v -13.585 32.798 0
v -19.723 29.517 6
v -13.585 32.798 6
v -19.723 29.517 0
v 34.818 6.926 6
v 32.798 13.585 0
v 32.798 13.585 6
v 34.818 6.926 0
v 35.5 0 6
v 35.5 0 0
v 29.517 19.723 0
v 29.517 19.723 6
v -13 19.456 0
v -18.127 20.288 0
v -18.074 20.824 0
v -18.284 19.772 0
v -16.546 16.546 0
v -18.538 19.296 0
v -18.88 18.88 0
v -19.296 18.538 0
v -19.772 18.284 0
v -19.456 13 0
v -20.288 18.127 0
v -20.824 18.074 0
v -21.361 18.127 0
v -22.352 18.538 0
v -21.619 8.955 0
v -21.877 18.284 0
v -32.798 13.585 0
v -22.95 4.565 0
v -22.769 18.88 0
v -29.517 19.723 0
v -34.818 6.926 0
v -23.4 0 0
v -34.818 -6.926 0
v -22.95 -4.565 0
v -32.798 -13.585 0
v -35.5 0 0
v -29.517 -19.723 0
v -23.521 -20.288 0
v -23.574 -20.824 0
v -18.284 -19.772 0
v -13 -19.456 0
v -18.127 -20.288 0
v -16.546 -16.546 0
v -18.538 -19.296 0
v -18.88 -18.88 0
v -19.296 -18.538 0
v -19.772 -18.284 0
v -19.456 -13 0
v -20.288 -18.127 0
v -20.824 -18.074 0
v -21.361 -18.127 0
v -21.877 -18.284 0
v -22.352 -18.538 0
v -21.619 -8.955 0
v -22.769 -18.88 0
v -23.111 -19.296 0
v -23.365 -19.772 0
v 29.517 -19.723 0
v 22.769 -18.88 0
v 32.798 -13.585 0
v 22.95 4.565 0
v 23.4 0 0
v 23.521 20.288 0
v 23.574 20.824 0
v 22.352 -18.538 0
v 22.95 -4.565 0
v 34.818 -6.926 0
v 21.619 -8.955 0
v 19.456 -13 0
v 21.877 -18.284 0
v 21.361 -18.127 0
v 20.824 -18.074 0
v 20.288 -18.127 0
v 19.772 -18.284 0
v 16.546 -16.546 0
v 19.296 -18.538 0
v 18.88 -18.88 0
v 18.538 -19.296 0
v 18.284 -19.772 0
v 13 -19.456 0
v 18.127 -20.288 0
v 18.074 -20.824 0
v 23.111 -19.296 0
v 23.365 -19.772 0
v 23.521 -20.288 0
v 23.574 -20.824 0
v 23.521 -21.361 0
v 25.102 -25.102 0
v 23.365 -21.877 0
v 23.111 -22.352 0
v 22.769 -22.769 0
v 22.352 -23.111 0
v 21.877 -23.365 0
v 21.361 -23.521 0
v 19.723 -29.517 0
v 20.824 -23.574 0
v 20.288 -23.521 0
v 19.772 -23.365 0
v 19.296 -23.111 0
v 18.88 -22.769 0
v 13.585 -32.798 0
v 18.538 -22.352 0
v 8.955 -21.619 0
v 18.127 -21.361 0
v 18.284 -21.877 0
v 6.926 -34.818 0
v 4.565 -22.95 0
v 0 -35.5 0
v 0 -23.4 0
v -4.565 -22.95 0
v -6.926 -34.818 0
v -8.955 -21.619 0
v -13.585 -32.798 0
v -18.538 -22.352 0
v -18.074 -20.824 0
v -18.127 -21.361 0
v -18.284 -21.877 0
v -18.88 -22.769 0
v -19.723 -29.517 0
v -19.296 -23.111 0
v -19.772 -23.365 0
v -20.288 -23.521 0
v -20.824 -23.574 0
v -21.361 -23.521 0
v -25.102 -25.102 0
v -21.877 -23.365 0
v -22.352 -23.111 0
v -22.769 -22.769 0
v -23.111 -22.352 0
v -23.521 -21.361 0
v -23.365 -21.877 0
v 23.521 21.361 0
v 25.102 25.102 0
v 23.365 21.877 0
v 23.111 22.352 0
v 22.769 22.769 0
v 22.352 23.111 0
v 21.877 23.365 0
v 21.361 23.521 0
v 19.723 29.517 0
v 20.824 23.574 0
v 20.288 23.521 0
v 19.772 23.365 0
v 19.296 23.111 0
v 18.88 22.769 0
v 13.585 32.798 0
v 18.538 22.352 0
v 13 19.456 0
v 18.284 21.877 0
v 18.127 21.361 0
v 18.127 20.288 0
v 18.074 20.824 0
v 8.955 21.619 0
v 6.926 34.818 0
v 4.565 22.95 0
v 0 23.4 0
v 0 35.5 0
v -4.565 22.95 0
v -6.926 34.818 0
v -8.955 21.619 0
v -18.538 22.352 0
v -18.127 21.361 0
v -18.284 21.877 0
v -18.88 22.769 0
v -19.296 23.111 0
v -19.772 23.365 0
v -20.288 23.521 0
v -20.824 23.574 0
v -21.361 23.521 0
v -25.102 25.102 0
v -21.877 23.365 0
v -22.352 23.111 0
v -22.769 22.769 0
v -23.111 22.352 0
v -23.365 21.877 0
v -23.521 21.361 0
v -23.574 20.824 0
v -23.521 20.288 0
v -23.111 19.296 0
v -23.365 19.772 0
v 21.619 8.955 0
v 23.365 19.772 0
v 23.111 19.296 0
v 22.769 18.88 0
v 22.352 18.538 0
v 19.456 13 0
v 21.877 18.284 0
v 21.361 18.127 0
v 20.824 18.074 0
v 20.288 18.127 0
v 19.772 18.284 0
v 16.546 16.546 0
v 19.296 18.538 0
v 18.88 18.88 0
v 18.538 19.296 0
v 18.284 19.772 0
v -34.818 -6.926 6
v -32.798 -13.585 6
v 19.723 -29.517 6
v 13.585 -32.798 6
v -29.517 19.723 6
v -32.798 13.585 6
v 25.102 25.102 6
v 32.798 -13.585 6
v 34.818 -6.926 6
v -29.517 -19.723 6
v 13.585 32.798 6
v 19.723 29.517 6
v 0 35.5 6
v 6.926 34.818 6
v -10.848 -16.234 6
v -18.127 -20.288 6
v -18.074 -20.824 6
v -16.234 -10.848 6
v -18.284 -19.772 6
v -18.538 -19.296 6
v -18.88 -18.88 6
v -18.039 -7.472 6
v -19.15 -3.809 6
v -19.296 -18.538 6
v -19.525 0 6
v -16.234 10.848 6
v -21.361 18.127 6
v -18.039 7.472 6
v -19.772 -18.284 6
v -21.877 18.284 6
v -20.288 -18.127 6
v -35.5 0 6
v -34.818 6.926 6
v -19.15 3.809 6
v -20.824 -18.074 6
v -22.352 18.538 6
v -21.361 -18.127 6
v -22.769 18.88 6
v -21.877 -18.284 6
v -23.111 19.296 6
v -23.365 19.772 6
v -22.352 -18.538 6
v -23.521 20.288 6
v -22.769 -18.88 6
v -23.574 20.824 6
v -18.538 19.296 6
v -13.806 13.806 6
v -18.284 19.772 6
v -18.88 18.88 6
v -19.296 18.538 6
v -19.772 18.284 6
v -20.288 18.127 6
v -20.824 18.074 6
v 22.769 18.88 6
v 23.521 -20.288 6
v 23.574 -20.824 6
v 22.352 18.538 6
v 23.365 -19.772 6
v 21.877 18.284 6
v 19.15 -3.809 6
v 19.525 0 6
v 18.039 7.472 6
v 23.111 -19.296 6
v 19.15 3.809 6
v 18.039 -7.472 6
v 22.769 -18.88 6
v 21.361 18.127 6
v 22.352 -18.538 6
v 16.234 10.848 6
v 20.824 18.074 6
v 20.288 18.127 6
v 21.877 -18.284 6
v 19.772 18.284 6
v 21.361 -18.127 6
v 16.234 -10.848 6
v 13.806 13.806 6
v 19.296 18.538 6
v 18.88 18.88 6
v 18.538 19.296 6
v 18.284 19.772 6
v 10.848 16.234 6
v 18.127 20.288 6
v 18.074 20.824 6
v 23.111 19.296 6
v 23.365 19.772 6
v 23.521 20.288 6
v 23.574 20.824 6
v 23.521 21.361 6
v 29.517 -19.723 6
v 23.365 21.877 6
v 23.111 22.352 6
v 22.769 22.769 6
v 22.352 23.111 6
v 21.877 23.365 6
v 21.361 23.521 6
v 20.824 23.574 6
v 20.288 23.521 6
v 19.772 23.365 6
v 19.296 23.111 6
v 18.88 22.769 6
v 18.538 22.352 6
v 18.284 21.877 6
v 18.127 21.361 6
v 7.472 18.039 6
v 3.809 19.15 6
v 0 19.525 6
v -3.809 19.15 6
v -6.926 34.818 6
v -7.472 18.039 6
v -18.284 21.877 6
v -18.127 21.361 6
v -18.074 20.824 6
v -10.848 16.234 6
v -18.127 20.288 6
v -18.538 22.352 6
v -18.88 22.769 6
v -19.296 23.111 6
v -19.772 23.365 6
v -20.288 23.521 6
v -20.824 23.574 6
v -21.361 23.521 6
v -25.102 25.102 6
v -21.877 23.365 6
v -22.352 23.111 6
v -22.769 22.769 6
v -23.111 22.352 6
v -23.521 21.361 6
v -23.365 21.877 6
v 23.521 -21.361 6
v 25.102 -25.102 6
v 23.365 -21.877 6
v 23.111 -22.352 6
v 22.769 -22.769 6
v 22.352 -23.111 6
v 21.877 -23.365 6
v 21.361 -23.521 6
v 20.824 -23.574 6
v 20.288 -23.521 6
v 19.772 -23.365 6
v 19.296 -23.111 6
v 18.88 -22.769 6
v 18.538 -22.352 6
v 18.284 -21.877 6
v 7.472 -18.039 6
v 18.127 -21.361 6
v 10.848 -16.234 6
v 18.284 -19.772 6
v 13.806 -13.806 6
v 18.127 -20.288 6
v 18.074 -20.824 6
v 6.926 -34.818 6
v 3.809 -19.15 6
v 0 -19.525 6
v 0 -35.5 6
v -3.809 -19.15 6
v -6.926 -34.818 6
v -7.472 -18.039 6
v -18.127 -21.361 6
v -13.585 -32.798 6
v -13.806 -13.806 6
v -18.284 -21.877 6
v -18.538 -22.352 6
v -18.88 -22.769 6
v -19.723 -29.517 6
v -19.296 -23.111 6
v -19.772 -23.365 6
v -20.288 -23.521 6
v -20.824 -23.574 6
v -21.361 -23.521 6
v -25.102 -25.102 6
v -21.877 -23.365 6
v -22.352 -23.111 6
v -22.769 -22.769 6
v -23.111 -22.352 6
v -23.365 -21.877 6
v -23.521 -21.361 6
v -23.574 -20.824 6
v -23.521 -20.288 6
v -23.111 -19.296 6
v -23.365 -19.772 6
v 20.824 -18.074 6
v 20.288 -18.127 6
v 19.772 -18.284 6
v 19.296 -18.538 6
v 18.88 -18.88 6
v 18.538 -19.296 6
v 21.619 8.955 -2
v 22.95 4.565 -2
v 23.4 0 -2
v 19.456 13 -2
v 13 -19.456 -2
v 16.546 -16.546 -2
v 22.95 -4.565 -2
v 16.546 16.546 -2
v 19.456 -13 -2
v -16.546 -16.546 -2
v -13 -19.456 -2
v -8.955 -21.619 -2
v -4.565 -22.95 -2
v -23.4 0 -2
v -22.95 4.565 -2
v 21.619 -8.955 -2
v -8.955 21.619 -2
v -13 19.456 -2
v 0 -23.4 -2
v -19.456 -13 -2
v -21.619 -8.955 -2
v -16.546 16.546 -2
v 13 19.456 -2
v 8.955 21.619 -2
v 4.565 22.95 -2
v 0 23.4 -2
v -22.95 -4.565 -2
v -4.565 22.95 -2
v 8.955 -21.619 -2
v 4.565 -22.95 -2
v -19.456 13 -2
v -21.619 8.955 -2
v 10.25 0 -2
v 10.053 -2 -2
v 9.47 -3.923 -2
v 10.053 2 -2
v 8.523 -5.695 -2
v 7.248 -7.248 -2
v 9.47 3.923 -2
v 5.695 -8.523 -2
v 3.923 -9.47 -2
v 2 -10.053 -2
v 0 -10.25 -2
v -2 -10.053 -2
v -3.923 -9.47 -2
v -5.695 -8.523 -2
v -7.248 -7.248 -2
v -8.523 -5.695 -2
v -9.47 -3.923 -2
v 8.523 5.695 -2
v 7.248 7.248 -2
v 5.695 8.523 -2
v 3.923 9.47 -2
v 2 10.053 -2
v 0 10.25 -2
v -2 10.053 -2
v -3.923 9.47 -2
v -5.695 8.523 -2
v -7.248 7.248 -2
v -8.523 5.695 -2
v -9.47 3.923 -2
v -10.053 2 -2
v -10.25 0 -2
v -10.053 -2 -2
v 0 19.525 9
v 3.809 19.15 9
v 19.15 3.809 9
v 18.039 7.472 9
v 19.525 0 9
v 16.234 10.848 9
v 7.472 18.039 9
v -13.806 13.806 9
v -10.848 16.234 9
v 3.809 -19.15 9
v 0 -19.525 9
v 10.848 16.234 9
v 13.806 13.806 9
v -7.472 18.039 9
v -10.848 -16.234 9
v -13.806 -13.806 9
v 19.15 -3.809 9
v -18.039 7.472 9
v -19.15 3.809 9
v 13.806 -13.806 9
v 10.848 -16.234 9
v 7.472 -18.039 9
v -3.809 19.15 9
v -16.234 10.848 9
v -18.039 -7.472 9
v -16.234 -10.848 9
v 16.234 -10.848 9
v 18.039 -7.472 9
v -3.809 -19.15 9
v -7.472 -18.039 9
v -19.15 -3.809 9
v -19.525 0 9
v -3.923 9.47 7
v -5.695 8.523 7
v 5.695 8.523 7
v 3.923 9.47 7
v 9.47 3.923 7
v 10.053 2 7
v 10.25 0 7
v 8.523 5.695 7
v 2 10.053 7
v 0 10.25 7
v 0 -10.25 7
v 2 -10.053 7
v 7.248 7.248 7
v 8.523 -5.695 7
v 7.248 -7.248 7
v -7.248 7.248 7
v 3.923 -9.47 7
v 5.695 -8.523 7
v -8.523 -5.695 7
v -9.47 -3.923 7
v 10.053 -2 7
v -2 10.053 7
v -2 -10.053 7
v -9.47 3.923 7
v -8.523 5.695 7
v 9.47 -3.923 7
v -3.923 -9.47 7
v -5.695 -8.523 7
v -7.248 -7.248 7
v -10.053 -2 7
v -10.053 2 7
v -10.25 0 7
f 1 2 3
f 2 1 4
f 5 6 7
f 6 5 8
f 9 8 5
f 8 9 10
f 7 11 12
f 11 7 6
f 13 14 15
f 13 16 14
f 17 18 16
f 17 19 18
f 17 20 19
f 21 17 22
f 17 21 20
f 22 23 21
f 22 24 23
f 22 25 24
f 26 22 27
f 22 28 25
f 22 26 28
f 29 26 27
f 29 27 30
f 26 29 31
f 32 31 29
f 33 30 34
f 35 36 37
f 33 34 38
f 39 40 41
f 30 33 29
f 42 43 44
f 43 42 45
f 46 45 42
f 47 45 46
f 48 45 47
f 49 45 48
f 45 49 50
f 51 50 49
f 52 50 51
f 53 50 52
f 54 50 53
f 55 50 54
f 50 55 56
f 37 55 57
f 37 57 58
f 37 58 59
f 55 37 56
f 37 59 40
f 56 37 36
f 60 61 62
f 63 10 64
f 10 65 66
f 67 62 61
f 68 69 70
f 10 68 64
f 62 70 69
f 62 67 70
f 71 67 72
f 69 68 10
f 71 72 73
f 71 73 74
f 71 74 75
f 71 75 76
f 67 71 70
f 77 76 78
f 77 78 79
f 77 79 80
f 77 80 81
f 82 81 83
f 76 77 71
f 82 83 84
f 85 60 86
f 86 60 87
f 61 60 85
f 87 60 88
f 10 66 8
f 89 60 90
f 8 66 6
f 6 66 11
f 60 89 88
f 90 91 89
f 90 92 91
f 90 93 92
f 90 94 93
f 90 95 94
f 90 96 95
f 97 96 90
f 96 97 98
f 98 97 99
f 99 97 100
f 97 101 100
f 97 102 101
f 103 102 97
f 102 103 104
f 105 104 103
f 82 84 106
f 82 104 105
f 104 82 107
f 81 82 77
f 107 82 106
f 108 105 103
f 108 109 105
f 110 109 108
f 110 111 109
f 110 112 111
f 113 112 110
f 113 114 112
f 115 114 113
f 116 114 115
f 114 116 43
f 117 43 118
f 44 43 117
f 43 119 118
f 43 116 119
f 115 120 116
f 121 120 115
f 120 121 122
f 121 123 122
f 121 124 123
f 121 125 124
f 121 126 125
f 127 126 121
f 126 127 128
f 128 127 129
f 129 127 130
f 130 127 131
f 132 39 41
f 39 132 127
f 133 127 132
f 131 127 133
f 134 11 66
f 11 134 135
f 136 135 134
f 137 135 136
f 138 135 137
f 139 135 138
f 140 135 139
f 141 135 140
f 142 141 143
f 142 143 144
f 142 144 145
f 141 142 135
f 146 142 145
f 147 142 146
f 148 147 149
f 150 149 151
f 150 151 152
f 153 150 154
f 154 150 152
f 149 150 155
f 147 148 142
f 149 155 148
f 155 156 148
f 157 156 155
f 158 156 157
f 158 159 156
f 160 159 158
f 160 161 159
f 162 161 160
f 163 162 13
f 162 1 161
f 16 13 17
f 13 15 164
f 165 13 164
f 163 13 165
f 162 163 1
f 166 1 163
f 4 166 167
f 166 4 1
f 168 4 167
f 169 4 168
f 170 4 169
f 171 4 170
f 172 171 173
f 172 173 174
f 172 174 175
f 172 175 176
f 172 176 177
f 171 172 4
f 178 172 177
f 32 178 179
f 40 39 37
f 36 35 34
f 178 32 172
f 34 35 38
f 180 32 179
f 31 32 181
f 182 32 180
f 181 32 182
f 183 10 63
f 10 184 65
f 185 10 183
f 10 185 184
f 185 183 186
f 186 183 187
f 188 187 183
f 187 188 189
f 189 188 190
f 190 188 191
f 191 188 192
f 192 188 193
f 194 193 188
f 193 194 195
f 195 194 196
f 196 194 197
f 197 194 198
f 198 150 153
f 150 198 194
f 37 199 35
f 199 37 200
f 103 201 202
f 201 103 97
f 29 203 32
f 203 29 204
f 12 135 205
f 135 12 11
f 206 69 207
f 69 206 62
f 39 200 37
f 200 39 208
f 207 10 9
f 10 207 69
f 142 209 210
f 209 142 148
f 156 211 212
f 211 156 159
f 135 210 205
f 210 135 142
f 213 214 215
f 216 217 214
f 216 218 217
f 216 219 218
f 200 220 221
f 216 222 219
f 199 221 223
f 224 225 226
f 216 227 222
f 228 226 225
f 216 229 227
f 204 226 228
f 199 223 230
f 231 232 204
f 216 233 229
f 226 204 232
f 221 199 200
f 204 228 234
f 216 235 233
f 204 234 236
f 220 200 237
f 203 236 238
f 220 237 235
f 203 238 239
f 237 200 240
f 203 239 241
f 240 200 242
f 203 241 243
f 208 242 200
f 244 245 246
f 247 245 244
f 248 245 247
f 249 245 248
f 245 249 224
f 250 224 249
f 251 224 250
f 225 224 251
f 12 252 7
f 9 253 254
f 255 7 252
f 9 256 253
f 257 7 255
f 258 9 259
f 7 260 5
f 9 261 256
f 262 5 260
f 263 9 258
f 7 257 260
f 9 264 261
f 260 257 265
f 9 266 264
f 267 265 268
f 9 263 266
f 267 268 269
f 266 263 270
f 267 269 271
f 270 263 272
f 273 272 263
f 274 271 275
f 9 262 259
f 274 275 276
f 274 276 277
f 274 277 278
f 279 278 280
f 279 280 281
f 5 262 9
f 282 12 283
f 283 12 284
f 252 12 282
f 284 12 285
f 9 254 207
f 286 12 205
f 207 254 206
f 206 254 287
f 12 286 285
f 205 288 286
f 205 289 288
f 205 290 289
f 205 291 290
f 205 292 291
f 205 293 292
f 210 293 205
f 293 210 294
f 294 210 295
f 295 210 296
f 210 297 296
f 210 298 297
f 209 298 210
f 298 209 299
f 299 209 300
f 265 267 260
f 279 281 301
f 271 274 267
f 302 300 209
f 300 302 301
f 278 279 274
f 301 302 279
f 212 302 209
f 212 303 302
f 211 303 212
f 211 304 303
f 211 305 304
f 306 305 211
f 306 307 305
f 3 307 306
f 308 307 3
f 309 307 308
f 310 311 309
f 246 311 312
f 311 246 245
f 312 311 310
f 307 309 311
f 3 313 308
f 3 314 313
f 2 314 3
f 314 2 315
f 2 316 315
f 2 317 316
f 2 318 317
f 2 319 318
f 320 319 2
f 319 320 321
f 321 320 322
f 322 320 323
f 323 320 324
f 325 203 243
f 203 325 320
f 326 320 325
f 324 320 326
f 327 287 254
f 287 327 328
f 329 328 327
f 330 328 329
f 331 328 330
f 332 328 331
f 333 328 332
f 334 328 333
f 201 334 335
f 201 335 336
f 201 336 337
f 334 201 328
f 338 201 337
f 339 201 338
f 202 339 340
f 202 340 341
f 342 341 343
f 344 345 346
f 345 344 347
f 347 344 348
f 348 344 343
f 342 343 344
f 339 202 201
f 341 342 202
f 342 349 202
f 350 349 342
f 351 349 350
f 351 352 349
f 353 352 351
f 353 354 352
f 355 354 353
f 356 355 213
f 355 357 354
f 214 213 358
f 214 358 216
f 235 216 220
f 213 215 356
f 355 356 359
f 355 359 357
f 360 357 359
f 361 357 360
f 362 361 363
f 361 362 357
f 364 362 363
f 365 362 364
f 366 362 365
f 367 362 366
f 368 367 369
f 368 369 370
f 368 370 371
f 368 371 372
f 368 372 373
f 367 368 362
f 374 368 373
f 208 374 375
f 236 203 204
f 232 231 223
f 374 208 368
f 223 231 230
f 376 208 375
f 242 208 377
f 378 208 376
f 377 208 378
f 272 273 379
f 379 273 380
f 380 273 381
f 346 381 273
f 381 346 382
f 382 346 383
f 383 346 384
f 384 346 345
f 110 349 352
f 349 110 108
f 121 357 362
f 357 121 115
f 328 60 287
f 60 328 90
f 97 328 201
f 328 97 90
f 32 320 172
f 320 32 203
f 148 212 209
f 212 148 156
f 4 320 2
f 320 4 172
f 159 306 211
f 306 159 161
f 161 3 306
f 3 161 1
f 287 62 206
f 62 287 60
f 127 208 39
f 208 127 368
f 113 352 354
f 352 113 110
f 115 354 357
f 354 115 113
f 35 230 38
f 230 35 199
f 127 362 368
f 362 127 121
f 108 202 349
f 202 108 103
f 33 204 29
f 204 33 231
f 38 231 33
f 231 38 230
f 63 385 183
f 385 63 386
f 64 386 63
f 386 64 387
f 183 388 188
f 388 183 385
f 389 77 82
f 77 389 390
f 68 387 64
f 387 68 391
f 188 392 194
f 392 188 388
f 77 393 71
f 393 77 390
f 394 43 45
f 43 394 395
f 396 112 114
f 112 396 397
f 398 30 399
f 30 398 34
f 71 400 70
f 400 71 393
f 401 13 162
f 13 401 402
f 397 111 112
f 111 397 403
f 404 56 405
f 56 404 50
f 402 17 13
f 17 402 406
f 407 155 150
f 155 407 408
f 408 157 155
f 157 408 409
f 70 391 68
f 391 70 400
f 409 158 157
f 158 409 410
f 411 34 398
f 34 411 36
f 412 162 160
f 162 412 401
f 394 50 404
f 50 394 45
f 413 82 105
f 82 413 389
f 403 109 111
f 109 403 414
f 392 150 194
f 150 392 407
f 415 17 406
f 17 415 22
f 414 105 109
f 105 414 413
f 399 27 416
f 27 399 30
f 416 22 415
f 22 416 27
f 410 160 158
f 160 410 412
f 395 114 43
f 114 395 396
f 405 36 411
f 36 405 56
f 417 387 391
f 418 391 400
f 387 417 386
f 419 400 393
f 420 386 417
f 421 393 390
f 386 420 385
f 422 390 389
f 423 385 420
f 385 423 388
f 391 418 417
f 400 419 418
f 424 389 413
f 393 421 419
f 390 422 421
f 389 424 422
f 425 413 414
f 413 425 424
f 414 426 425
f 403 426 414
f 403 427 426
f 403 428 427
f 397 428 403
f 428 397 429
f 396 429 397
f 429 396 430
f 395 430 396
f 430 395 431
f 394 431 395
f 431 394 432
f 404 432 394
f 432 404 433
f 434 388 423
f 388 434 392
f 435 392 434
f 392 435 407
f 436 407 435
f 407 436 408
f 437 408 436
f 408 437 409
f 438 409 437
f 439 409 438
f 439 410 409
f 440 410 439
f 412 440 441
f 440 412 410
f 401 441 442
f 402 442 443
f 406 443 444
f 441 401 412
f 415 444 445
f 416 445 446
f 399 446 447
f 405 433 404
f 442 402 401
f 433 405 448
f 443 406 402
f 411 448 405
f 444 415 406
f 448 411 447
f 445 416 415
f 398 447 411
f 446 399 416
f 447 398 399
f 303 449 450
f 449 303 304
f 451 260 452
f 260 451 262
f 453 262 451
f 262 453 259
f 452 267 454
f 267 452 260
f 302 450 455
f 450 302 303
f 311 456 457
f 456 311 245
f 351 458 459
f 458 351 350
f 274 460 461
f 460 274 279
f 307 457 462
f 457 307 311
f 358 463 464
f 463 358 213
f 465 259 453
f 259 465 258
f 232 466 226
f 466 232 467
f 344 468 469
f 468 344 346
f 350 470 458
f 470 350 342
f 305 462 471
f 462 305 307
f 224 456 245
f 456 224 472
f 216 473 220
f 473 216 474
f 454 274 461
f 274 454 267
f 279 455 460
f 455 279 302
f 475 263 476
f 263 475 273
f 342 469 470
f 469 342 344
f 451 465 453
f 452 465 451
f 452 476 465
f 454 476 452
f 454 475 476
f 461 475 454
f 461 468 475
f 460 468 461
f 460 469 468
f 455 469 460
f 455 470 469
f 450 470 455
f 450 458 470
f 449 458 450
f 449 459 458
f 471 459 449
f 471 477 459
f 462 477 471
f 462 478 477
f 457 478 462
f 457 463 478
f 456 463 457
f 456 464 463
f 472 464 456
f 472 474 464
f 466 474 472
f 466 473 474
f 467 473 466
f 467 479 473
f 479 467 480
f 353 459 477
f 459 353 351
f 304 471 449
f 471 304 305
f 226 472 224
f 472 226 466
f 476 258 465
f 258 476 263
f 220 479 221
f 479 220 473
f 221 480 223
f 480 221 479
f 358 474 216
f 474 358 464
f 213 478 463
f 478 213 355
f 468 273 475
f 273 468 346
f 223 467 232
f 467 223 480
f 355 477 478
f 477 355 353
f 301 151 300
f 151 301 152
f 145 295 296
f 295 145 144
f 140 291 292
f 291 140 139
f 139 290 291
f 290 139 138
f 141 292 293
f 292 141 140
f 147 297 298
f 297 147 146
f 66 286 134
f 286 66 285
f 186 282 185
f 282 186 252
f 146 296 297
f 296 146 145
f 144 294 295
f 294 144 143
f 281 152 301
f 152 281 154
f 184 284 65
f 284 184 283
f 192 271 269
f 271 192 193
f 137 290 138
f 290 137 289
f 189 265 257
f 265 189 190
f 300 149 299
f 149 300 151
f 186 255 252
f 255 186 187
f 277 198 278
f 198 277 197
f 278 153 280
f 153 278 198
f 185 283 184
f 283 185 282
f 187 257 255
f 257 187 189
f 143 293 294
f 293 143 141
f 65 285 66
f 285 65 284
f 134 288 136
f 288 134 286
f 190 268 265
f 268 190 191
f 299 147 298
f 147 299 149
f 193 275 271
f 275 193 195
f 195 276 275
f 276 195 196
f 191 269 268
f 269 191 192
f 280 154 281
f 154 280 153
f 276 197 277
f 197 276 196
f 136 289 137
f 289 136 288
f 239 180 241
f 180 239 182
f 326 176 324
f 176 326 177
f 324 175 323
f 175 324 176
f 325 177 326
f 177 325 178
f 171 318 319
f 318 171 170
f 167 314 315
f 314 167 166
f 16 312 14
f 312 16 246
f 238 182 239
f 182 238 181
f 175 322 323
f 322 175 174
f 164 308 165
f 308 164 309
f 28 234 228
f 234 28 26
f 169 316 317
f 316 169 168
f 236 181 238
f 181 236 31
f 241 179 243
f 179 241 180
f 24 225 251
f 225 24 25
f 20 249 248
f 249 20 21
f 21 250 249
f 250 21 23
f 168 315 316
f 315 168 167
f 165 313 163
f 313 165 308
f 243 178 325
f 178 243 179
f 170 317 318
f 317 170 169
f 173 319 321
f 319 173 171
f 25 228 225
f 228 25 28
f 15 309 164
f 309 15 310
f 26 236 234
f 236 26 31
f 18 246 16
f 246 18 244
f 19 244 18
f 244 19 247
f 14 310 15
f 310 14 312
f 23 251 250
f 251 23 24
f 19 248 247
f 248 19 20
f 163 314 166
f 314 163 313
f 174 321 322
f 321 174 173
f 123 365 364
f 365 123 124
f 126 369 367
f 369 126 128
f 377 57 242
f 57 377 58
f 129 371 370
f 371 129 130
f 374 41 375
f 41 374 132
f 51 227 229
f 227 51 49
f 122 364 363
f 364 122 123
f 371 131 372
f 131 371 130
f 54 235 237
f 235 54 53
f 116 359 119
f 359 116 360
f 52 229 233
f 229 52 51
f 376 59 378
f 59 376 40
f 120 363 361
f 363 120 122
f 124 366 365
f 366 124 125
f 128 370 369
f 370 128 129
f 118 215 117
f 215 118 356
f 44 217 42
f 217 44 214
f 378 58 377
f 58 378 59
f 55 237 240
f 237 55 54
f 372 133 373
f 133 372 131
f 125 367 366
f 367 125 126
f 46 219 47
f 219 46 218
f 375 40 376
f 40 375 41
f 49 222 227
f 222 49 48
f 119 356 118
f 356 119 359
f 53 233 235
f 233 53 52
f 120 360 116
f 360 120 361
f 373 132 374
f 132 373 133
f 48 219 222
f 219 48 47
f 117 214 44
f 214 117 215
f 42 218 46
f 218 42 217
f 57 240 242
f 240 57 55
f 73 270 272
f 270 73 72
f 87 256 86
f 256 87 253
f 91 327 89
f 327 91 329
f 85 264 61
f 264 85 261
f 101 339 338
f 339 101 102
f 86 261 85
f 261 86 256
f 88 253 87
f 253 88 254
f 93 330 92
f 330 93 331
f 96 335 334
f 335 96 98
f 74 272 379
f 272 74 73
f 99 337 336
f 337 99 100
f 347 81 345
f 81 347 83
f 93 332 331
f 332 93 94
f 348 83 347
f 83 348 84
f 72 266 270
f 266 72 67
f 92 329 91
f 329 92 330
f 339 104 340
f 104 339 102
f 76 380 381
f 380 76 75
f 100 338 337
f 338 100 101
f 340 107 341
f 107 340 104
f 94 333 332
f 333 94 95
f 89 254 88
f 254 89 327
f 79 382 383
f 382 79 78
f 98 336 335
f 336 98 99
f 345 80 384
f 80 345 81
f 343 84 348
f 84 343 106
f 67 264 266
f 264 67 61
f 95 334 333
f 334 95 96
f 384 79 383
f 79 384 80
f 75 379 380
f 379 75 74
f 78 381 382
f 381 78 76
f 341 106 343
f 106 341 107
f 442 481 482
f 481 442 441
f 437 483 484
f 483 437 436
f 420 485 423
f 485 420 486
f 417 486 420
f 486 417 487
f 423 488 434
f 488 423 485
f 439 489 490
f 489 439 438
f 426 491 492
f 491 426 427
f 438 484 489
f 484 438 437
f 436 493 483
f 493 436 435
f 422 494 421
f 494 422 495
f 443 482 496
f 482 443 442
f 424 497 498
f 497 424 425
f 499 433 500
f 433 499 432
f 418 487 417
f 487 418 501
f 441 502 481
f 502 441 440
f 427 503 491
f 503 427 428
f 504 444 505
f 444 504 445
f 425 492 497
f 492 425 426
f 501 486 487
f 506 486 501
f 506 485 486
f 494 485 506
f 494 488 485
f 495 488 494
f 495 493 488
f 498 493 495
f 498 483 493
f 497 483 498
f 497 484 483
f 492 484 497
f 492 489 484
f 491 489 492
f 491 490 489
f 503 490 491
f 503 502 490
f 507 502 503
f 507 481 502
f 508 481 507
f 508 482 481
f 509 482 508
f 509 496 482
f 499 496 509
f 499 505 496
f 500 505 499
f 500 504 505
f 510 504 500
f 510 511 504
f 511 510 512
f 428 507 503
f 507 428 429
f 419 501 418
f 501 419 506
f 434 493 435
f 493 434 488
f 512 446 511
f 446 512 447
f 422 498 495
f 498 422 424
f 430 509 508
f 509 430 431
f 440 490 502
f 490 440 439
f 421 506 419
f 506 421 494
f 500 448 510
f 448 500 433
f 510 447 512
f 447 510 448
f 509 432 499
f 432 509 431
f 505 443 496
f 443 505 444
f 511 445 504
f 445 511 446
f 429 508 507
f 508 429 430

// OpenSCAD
$fn = 32;

// ----------------------------------------------------------------------
// Retaining cap: 6204 cover, 71 mm, spigot 46.8 mm
// ----------------------------------------------------------------------

// --- parameters (mm) ---
cover_d = 71;             // cover diameter
cover_t = 6;              // cover thickness
spigot_d = 46.8;          // spigot that enters the housing
spigot_h = 2;             // spigot height
shaft_d = 20.5;           // shaft opening
bolt_d = 5.5;             // bolt clearance
bolt_r = 29.45;           // bolt circle radius
dome_h = 3;               // raised centre

module cover() {
  cylinder(h = cover_t, d = cover_d);
}

module spigot() {
  /* sunk 1 mm into the cover; the spigot sets the overall height */
  translate([0, 0, -spigot_h]) cylinder(h = spigot_h + 1, d = spigot_d);
}

module dome() {
  translate([0, 0, cover_t - 1]) cylinder(h = dome_h + 1, d = cover_d * 0.55);
}

difference() {
  union() {
    cover();
    spigot();
    dome();
  }
  for (i = [0 : 3]) rotate([0, 0, 45 + i * 90]) translate([bolt_r, 0, -spigot_h - 1])
    cylinder(h = spigot_h + cover_t + 2, d = bolt_d);
  translate([0, 0, -spigot_h - 1]) cylinder(h = spigot_h + cover_t + 2, d = shaft_d);
}
